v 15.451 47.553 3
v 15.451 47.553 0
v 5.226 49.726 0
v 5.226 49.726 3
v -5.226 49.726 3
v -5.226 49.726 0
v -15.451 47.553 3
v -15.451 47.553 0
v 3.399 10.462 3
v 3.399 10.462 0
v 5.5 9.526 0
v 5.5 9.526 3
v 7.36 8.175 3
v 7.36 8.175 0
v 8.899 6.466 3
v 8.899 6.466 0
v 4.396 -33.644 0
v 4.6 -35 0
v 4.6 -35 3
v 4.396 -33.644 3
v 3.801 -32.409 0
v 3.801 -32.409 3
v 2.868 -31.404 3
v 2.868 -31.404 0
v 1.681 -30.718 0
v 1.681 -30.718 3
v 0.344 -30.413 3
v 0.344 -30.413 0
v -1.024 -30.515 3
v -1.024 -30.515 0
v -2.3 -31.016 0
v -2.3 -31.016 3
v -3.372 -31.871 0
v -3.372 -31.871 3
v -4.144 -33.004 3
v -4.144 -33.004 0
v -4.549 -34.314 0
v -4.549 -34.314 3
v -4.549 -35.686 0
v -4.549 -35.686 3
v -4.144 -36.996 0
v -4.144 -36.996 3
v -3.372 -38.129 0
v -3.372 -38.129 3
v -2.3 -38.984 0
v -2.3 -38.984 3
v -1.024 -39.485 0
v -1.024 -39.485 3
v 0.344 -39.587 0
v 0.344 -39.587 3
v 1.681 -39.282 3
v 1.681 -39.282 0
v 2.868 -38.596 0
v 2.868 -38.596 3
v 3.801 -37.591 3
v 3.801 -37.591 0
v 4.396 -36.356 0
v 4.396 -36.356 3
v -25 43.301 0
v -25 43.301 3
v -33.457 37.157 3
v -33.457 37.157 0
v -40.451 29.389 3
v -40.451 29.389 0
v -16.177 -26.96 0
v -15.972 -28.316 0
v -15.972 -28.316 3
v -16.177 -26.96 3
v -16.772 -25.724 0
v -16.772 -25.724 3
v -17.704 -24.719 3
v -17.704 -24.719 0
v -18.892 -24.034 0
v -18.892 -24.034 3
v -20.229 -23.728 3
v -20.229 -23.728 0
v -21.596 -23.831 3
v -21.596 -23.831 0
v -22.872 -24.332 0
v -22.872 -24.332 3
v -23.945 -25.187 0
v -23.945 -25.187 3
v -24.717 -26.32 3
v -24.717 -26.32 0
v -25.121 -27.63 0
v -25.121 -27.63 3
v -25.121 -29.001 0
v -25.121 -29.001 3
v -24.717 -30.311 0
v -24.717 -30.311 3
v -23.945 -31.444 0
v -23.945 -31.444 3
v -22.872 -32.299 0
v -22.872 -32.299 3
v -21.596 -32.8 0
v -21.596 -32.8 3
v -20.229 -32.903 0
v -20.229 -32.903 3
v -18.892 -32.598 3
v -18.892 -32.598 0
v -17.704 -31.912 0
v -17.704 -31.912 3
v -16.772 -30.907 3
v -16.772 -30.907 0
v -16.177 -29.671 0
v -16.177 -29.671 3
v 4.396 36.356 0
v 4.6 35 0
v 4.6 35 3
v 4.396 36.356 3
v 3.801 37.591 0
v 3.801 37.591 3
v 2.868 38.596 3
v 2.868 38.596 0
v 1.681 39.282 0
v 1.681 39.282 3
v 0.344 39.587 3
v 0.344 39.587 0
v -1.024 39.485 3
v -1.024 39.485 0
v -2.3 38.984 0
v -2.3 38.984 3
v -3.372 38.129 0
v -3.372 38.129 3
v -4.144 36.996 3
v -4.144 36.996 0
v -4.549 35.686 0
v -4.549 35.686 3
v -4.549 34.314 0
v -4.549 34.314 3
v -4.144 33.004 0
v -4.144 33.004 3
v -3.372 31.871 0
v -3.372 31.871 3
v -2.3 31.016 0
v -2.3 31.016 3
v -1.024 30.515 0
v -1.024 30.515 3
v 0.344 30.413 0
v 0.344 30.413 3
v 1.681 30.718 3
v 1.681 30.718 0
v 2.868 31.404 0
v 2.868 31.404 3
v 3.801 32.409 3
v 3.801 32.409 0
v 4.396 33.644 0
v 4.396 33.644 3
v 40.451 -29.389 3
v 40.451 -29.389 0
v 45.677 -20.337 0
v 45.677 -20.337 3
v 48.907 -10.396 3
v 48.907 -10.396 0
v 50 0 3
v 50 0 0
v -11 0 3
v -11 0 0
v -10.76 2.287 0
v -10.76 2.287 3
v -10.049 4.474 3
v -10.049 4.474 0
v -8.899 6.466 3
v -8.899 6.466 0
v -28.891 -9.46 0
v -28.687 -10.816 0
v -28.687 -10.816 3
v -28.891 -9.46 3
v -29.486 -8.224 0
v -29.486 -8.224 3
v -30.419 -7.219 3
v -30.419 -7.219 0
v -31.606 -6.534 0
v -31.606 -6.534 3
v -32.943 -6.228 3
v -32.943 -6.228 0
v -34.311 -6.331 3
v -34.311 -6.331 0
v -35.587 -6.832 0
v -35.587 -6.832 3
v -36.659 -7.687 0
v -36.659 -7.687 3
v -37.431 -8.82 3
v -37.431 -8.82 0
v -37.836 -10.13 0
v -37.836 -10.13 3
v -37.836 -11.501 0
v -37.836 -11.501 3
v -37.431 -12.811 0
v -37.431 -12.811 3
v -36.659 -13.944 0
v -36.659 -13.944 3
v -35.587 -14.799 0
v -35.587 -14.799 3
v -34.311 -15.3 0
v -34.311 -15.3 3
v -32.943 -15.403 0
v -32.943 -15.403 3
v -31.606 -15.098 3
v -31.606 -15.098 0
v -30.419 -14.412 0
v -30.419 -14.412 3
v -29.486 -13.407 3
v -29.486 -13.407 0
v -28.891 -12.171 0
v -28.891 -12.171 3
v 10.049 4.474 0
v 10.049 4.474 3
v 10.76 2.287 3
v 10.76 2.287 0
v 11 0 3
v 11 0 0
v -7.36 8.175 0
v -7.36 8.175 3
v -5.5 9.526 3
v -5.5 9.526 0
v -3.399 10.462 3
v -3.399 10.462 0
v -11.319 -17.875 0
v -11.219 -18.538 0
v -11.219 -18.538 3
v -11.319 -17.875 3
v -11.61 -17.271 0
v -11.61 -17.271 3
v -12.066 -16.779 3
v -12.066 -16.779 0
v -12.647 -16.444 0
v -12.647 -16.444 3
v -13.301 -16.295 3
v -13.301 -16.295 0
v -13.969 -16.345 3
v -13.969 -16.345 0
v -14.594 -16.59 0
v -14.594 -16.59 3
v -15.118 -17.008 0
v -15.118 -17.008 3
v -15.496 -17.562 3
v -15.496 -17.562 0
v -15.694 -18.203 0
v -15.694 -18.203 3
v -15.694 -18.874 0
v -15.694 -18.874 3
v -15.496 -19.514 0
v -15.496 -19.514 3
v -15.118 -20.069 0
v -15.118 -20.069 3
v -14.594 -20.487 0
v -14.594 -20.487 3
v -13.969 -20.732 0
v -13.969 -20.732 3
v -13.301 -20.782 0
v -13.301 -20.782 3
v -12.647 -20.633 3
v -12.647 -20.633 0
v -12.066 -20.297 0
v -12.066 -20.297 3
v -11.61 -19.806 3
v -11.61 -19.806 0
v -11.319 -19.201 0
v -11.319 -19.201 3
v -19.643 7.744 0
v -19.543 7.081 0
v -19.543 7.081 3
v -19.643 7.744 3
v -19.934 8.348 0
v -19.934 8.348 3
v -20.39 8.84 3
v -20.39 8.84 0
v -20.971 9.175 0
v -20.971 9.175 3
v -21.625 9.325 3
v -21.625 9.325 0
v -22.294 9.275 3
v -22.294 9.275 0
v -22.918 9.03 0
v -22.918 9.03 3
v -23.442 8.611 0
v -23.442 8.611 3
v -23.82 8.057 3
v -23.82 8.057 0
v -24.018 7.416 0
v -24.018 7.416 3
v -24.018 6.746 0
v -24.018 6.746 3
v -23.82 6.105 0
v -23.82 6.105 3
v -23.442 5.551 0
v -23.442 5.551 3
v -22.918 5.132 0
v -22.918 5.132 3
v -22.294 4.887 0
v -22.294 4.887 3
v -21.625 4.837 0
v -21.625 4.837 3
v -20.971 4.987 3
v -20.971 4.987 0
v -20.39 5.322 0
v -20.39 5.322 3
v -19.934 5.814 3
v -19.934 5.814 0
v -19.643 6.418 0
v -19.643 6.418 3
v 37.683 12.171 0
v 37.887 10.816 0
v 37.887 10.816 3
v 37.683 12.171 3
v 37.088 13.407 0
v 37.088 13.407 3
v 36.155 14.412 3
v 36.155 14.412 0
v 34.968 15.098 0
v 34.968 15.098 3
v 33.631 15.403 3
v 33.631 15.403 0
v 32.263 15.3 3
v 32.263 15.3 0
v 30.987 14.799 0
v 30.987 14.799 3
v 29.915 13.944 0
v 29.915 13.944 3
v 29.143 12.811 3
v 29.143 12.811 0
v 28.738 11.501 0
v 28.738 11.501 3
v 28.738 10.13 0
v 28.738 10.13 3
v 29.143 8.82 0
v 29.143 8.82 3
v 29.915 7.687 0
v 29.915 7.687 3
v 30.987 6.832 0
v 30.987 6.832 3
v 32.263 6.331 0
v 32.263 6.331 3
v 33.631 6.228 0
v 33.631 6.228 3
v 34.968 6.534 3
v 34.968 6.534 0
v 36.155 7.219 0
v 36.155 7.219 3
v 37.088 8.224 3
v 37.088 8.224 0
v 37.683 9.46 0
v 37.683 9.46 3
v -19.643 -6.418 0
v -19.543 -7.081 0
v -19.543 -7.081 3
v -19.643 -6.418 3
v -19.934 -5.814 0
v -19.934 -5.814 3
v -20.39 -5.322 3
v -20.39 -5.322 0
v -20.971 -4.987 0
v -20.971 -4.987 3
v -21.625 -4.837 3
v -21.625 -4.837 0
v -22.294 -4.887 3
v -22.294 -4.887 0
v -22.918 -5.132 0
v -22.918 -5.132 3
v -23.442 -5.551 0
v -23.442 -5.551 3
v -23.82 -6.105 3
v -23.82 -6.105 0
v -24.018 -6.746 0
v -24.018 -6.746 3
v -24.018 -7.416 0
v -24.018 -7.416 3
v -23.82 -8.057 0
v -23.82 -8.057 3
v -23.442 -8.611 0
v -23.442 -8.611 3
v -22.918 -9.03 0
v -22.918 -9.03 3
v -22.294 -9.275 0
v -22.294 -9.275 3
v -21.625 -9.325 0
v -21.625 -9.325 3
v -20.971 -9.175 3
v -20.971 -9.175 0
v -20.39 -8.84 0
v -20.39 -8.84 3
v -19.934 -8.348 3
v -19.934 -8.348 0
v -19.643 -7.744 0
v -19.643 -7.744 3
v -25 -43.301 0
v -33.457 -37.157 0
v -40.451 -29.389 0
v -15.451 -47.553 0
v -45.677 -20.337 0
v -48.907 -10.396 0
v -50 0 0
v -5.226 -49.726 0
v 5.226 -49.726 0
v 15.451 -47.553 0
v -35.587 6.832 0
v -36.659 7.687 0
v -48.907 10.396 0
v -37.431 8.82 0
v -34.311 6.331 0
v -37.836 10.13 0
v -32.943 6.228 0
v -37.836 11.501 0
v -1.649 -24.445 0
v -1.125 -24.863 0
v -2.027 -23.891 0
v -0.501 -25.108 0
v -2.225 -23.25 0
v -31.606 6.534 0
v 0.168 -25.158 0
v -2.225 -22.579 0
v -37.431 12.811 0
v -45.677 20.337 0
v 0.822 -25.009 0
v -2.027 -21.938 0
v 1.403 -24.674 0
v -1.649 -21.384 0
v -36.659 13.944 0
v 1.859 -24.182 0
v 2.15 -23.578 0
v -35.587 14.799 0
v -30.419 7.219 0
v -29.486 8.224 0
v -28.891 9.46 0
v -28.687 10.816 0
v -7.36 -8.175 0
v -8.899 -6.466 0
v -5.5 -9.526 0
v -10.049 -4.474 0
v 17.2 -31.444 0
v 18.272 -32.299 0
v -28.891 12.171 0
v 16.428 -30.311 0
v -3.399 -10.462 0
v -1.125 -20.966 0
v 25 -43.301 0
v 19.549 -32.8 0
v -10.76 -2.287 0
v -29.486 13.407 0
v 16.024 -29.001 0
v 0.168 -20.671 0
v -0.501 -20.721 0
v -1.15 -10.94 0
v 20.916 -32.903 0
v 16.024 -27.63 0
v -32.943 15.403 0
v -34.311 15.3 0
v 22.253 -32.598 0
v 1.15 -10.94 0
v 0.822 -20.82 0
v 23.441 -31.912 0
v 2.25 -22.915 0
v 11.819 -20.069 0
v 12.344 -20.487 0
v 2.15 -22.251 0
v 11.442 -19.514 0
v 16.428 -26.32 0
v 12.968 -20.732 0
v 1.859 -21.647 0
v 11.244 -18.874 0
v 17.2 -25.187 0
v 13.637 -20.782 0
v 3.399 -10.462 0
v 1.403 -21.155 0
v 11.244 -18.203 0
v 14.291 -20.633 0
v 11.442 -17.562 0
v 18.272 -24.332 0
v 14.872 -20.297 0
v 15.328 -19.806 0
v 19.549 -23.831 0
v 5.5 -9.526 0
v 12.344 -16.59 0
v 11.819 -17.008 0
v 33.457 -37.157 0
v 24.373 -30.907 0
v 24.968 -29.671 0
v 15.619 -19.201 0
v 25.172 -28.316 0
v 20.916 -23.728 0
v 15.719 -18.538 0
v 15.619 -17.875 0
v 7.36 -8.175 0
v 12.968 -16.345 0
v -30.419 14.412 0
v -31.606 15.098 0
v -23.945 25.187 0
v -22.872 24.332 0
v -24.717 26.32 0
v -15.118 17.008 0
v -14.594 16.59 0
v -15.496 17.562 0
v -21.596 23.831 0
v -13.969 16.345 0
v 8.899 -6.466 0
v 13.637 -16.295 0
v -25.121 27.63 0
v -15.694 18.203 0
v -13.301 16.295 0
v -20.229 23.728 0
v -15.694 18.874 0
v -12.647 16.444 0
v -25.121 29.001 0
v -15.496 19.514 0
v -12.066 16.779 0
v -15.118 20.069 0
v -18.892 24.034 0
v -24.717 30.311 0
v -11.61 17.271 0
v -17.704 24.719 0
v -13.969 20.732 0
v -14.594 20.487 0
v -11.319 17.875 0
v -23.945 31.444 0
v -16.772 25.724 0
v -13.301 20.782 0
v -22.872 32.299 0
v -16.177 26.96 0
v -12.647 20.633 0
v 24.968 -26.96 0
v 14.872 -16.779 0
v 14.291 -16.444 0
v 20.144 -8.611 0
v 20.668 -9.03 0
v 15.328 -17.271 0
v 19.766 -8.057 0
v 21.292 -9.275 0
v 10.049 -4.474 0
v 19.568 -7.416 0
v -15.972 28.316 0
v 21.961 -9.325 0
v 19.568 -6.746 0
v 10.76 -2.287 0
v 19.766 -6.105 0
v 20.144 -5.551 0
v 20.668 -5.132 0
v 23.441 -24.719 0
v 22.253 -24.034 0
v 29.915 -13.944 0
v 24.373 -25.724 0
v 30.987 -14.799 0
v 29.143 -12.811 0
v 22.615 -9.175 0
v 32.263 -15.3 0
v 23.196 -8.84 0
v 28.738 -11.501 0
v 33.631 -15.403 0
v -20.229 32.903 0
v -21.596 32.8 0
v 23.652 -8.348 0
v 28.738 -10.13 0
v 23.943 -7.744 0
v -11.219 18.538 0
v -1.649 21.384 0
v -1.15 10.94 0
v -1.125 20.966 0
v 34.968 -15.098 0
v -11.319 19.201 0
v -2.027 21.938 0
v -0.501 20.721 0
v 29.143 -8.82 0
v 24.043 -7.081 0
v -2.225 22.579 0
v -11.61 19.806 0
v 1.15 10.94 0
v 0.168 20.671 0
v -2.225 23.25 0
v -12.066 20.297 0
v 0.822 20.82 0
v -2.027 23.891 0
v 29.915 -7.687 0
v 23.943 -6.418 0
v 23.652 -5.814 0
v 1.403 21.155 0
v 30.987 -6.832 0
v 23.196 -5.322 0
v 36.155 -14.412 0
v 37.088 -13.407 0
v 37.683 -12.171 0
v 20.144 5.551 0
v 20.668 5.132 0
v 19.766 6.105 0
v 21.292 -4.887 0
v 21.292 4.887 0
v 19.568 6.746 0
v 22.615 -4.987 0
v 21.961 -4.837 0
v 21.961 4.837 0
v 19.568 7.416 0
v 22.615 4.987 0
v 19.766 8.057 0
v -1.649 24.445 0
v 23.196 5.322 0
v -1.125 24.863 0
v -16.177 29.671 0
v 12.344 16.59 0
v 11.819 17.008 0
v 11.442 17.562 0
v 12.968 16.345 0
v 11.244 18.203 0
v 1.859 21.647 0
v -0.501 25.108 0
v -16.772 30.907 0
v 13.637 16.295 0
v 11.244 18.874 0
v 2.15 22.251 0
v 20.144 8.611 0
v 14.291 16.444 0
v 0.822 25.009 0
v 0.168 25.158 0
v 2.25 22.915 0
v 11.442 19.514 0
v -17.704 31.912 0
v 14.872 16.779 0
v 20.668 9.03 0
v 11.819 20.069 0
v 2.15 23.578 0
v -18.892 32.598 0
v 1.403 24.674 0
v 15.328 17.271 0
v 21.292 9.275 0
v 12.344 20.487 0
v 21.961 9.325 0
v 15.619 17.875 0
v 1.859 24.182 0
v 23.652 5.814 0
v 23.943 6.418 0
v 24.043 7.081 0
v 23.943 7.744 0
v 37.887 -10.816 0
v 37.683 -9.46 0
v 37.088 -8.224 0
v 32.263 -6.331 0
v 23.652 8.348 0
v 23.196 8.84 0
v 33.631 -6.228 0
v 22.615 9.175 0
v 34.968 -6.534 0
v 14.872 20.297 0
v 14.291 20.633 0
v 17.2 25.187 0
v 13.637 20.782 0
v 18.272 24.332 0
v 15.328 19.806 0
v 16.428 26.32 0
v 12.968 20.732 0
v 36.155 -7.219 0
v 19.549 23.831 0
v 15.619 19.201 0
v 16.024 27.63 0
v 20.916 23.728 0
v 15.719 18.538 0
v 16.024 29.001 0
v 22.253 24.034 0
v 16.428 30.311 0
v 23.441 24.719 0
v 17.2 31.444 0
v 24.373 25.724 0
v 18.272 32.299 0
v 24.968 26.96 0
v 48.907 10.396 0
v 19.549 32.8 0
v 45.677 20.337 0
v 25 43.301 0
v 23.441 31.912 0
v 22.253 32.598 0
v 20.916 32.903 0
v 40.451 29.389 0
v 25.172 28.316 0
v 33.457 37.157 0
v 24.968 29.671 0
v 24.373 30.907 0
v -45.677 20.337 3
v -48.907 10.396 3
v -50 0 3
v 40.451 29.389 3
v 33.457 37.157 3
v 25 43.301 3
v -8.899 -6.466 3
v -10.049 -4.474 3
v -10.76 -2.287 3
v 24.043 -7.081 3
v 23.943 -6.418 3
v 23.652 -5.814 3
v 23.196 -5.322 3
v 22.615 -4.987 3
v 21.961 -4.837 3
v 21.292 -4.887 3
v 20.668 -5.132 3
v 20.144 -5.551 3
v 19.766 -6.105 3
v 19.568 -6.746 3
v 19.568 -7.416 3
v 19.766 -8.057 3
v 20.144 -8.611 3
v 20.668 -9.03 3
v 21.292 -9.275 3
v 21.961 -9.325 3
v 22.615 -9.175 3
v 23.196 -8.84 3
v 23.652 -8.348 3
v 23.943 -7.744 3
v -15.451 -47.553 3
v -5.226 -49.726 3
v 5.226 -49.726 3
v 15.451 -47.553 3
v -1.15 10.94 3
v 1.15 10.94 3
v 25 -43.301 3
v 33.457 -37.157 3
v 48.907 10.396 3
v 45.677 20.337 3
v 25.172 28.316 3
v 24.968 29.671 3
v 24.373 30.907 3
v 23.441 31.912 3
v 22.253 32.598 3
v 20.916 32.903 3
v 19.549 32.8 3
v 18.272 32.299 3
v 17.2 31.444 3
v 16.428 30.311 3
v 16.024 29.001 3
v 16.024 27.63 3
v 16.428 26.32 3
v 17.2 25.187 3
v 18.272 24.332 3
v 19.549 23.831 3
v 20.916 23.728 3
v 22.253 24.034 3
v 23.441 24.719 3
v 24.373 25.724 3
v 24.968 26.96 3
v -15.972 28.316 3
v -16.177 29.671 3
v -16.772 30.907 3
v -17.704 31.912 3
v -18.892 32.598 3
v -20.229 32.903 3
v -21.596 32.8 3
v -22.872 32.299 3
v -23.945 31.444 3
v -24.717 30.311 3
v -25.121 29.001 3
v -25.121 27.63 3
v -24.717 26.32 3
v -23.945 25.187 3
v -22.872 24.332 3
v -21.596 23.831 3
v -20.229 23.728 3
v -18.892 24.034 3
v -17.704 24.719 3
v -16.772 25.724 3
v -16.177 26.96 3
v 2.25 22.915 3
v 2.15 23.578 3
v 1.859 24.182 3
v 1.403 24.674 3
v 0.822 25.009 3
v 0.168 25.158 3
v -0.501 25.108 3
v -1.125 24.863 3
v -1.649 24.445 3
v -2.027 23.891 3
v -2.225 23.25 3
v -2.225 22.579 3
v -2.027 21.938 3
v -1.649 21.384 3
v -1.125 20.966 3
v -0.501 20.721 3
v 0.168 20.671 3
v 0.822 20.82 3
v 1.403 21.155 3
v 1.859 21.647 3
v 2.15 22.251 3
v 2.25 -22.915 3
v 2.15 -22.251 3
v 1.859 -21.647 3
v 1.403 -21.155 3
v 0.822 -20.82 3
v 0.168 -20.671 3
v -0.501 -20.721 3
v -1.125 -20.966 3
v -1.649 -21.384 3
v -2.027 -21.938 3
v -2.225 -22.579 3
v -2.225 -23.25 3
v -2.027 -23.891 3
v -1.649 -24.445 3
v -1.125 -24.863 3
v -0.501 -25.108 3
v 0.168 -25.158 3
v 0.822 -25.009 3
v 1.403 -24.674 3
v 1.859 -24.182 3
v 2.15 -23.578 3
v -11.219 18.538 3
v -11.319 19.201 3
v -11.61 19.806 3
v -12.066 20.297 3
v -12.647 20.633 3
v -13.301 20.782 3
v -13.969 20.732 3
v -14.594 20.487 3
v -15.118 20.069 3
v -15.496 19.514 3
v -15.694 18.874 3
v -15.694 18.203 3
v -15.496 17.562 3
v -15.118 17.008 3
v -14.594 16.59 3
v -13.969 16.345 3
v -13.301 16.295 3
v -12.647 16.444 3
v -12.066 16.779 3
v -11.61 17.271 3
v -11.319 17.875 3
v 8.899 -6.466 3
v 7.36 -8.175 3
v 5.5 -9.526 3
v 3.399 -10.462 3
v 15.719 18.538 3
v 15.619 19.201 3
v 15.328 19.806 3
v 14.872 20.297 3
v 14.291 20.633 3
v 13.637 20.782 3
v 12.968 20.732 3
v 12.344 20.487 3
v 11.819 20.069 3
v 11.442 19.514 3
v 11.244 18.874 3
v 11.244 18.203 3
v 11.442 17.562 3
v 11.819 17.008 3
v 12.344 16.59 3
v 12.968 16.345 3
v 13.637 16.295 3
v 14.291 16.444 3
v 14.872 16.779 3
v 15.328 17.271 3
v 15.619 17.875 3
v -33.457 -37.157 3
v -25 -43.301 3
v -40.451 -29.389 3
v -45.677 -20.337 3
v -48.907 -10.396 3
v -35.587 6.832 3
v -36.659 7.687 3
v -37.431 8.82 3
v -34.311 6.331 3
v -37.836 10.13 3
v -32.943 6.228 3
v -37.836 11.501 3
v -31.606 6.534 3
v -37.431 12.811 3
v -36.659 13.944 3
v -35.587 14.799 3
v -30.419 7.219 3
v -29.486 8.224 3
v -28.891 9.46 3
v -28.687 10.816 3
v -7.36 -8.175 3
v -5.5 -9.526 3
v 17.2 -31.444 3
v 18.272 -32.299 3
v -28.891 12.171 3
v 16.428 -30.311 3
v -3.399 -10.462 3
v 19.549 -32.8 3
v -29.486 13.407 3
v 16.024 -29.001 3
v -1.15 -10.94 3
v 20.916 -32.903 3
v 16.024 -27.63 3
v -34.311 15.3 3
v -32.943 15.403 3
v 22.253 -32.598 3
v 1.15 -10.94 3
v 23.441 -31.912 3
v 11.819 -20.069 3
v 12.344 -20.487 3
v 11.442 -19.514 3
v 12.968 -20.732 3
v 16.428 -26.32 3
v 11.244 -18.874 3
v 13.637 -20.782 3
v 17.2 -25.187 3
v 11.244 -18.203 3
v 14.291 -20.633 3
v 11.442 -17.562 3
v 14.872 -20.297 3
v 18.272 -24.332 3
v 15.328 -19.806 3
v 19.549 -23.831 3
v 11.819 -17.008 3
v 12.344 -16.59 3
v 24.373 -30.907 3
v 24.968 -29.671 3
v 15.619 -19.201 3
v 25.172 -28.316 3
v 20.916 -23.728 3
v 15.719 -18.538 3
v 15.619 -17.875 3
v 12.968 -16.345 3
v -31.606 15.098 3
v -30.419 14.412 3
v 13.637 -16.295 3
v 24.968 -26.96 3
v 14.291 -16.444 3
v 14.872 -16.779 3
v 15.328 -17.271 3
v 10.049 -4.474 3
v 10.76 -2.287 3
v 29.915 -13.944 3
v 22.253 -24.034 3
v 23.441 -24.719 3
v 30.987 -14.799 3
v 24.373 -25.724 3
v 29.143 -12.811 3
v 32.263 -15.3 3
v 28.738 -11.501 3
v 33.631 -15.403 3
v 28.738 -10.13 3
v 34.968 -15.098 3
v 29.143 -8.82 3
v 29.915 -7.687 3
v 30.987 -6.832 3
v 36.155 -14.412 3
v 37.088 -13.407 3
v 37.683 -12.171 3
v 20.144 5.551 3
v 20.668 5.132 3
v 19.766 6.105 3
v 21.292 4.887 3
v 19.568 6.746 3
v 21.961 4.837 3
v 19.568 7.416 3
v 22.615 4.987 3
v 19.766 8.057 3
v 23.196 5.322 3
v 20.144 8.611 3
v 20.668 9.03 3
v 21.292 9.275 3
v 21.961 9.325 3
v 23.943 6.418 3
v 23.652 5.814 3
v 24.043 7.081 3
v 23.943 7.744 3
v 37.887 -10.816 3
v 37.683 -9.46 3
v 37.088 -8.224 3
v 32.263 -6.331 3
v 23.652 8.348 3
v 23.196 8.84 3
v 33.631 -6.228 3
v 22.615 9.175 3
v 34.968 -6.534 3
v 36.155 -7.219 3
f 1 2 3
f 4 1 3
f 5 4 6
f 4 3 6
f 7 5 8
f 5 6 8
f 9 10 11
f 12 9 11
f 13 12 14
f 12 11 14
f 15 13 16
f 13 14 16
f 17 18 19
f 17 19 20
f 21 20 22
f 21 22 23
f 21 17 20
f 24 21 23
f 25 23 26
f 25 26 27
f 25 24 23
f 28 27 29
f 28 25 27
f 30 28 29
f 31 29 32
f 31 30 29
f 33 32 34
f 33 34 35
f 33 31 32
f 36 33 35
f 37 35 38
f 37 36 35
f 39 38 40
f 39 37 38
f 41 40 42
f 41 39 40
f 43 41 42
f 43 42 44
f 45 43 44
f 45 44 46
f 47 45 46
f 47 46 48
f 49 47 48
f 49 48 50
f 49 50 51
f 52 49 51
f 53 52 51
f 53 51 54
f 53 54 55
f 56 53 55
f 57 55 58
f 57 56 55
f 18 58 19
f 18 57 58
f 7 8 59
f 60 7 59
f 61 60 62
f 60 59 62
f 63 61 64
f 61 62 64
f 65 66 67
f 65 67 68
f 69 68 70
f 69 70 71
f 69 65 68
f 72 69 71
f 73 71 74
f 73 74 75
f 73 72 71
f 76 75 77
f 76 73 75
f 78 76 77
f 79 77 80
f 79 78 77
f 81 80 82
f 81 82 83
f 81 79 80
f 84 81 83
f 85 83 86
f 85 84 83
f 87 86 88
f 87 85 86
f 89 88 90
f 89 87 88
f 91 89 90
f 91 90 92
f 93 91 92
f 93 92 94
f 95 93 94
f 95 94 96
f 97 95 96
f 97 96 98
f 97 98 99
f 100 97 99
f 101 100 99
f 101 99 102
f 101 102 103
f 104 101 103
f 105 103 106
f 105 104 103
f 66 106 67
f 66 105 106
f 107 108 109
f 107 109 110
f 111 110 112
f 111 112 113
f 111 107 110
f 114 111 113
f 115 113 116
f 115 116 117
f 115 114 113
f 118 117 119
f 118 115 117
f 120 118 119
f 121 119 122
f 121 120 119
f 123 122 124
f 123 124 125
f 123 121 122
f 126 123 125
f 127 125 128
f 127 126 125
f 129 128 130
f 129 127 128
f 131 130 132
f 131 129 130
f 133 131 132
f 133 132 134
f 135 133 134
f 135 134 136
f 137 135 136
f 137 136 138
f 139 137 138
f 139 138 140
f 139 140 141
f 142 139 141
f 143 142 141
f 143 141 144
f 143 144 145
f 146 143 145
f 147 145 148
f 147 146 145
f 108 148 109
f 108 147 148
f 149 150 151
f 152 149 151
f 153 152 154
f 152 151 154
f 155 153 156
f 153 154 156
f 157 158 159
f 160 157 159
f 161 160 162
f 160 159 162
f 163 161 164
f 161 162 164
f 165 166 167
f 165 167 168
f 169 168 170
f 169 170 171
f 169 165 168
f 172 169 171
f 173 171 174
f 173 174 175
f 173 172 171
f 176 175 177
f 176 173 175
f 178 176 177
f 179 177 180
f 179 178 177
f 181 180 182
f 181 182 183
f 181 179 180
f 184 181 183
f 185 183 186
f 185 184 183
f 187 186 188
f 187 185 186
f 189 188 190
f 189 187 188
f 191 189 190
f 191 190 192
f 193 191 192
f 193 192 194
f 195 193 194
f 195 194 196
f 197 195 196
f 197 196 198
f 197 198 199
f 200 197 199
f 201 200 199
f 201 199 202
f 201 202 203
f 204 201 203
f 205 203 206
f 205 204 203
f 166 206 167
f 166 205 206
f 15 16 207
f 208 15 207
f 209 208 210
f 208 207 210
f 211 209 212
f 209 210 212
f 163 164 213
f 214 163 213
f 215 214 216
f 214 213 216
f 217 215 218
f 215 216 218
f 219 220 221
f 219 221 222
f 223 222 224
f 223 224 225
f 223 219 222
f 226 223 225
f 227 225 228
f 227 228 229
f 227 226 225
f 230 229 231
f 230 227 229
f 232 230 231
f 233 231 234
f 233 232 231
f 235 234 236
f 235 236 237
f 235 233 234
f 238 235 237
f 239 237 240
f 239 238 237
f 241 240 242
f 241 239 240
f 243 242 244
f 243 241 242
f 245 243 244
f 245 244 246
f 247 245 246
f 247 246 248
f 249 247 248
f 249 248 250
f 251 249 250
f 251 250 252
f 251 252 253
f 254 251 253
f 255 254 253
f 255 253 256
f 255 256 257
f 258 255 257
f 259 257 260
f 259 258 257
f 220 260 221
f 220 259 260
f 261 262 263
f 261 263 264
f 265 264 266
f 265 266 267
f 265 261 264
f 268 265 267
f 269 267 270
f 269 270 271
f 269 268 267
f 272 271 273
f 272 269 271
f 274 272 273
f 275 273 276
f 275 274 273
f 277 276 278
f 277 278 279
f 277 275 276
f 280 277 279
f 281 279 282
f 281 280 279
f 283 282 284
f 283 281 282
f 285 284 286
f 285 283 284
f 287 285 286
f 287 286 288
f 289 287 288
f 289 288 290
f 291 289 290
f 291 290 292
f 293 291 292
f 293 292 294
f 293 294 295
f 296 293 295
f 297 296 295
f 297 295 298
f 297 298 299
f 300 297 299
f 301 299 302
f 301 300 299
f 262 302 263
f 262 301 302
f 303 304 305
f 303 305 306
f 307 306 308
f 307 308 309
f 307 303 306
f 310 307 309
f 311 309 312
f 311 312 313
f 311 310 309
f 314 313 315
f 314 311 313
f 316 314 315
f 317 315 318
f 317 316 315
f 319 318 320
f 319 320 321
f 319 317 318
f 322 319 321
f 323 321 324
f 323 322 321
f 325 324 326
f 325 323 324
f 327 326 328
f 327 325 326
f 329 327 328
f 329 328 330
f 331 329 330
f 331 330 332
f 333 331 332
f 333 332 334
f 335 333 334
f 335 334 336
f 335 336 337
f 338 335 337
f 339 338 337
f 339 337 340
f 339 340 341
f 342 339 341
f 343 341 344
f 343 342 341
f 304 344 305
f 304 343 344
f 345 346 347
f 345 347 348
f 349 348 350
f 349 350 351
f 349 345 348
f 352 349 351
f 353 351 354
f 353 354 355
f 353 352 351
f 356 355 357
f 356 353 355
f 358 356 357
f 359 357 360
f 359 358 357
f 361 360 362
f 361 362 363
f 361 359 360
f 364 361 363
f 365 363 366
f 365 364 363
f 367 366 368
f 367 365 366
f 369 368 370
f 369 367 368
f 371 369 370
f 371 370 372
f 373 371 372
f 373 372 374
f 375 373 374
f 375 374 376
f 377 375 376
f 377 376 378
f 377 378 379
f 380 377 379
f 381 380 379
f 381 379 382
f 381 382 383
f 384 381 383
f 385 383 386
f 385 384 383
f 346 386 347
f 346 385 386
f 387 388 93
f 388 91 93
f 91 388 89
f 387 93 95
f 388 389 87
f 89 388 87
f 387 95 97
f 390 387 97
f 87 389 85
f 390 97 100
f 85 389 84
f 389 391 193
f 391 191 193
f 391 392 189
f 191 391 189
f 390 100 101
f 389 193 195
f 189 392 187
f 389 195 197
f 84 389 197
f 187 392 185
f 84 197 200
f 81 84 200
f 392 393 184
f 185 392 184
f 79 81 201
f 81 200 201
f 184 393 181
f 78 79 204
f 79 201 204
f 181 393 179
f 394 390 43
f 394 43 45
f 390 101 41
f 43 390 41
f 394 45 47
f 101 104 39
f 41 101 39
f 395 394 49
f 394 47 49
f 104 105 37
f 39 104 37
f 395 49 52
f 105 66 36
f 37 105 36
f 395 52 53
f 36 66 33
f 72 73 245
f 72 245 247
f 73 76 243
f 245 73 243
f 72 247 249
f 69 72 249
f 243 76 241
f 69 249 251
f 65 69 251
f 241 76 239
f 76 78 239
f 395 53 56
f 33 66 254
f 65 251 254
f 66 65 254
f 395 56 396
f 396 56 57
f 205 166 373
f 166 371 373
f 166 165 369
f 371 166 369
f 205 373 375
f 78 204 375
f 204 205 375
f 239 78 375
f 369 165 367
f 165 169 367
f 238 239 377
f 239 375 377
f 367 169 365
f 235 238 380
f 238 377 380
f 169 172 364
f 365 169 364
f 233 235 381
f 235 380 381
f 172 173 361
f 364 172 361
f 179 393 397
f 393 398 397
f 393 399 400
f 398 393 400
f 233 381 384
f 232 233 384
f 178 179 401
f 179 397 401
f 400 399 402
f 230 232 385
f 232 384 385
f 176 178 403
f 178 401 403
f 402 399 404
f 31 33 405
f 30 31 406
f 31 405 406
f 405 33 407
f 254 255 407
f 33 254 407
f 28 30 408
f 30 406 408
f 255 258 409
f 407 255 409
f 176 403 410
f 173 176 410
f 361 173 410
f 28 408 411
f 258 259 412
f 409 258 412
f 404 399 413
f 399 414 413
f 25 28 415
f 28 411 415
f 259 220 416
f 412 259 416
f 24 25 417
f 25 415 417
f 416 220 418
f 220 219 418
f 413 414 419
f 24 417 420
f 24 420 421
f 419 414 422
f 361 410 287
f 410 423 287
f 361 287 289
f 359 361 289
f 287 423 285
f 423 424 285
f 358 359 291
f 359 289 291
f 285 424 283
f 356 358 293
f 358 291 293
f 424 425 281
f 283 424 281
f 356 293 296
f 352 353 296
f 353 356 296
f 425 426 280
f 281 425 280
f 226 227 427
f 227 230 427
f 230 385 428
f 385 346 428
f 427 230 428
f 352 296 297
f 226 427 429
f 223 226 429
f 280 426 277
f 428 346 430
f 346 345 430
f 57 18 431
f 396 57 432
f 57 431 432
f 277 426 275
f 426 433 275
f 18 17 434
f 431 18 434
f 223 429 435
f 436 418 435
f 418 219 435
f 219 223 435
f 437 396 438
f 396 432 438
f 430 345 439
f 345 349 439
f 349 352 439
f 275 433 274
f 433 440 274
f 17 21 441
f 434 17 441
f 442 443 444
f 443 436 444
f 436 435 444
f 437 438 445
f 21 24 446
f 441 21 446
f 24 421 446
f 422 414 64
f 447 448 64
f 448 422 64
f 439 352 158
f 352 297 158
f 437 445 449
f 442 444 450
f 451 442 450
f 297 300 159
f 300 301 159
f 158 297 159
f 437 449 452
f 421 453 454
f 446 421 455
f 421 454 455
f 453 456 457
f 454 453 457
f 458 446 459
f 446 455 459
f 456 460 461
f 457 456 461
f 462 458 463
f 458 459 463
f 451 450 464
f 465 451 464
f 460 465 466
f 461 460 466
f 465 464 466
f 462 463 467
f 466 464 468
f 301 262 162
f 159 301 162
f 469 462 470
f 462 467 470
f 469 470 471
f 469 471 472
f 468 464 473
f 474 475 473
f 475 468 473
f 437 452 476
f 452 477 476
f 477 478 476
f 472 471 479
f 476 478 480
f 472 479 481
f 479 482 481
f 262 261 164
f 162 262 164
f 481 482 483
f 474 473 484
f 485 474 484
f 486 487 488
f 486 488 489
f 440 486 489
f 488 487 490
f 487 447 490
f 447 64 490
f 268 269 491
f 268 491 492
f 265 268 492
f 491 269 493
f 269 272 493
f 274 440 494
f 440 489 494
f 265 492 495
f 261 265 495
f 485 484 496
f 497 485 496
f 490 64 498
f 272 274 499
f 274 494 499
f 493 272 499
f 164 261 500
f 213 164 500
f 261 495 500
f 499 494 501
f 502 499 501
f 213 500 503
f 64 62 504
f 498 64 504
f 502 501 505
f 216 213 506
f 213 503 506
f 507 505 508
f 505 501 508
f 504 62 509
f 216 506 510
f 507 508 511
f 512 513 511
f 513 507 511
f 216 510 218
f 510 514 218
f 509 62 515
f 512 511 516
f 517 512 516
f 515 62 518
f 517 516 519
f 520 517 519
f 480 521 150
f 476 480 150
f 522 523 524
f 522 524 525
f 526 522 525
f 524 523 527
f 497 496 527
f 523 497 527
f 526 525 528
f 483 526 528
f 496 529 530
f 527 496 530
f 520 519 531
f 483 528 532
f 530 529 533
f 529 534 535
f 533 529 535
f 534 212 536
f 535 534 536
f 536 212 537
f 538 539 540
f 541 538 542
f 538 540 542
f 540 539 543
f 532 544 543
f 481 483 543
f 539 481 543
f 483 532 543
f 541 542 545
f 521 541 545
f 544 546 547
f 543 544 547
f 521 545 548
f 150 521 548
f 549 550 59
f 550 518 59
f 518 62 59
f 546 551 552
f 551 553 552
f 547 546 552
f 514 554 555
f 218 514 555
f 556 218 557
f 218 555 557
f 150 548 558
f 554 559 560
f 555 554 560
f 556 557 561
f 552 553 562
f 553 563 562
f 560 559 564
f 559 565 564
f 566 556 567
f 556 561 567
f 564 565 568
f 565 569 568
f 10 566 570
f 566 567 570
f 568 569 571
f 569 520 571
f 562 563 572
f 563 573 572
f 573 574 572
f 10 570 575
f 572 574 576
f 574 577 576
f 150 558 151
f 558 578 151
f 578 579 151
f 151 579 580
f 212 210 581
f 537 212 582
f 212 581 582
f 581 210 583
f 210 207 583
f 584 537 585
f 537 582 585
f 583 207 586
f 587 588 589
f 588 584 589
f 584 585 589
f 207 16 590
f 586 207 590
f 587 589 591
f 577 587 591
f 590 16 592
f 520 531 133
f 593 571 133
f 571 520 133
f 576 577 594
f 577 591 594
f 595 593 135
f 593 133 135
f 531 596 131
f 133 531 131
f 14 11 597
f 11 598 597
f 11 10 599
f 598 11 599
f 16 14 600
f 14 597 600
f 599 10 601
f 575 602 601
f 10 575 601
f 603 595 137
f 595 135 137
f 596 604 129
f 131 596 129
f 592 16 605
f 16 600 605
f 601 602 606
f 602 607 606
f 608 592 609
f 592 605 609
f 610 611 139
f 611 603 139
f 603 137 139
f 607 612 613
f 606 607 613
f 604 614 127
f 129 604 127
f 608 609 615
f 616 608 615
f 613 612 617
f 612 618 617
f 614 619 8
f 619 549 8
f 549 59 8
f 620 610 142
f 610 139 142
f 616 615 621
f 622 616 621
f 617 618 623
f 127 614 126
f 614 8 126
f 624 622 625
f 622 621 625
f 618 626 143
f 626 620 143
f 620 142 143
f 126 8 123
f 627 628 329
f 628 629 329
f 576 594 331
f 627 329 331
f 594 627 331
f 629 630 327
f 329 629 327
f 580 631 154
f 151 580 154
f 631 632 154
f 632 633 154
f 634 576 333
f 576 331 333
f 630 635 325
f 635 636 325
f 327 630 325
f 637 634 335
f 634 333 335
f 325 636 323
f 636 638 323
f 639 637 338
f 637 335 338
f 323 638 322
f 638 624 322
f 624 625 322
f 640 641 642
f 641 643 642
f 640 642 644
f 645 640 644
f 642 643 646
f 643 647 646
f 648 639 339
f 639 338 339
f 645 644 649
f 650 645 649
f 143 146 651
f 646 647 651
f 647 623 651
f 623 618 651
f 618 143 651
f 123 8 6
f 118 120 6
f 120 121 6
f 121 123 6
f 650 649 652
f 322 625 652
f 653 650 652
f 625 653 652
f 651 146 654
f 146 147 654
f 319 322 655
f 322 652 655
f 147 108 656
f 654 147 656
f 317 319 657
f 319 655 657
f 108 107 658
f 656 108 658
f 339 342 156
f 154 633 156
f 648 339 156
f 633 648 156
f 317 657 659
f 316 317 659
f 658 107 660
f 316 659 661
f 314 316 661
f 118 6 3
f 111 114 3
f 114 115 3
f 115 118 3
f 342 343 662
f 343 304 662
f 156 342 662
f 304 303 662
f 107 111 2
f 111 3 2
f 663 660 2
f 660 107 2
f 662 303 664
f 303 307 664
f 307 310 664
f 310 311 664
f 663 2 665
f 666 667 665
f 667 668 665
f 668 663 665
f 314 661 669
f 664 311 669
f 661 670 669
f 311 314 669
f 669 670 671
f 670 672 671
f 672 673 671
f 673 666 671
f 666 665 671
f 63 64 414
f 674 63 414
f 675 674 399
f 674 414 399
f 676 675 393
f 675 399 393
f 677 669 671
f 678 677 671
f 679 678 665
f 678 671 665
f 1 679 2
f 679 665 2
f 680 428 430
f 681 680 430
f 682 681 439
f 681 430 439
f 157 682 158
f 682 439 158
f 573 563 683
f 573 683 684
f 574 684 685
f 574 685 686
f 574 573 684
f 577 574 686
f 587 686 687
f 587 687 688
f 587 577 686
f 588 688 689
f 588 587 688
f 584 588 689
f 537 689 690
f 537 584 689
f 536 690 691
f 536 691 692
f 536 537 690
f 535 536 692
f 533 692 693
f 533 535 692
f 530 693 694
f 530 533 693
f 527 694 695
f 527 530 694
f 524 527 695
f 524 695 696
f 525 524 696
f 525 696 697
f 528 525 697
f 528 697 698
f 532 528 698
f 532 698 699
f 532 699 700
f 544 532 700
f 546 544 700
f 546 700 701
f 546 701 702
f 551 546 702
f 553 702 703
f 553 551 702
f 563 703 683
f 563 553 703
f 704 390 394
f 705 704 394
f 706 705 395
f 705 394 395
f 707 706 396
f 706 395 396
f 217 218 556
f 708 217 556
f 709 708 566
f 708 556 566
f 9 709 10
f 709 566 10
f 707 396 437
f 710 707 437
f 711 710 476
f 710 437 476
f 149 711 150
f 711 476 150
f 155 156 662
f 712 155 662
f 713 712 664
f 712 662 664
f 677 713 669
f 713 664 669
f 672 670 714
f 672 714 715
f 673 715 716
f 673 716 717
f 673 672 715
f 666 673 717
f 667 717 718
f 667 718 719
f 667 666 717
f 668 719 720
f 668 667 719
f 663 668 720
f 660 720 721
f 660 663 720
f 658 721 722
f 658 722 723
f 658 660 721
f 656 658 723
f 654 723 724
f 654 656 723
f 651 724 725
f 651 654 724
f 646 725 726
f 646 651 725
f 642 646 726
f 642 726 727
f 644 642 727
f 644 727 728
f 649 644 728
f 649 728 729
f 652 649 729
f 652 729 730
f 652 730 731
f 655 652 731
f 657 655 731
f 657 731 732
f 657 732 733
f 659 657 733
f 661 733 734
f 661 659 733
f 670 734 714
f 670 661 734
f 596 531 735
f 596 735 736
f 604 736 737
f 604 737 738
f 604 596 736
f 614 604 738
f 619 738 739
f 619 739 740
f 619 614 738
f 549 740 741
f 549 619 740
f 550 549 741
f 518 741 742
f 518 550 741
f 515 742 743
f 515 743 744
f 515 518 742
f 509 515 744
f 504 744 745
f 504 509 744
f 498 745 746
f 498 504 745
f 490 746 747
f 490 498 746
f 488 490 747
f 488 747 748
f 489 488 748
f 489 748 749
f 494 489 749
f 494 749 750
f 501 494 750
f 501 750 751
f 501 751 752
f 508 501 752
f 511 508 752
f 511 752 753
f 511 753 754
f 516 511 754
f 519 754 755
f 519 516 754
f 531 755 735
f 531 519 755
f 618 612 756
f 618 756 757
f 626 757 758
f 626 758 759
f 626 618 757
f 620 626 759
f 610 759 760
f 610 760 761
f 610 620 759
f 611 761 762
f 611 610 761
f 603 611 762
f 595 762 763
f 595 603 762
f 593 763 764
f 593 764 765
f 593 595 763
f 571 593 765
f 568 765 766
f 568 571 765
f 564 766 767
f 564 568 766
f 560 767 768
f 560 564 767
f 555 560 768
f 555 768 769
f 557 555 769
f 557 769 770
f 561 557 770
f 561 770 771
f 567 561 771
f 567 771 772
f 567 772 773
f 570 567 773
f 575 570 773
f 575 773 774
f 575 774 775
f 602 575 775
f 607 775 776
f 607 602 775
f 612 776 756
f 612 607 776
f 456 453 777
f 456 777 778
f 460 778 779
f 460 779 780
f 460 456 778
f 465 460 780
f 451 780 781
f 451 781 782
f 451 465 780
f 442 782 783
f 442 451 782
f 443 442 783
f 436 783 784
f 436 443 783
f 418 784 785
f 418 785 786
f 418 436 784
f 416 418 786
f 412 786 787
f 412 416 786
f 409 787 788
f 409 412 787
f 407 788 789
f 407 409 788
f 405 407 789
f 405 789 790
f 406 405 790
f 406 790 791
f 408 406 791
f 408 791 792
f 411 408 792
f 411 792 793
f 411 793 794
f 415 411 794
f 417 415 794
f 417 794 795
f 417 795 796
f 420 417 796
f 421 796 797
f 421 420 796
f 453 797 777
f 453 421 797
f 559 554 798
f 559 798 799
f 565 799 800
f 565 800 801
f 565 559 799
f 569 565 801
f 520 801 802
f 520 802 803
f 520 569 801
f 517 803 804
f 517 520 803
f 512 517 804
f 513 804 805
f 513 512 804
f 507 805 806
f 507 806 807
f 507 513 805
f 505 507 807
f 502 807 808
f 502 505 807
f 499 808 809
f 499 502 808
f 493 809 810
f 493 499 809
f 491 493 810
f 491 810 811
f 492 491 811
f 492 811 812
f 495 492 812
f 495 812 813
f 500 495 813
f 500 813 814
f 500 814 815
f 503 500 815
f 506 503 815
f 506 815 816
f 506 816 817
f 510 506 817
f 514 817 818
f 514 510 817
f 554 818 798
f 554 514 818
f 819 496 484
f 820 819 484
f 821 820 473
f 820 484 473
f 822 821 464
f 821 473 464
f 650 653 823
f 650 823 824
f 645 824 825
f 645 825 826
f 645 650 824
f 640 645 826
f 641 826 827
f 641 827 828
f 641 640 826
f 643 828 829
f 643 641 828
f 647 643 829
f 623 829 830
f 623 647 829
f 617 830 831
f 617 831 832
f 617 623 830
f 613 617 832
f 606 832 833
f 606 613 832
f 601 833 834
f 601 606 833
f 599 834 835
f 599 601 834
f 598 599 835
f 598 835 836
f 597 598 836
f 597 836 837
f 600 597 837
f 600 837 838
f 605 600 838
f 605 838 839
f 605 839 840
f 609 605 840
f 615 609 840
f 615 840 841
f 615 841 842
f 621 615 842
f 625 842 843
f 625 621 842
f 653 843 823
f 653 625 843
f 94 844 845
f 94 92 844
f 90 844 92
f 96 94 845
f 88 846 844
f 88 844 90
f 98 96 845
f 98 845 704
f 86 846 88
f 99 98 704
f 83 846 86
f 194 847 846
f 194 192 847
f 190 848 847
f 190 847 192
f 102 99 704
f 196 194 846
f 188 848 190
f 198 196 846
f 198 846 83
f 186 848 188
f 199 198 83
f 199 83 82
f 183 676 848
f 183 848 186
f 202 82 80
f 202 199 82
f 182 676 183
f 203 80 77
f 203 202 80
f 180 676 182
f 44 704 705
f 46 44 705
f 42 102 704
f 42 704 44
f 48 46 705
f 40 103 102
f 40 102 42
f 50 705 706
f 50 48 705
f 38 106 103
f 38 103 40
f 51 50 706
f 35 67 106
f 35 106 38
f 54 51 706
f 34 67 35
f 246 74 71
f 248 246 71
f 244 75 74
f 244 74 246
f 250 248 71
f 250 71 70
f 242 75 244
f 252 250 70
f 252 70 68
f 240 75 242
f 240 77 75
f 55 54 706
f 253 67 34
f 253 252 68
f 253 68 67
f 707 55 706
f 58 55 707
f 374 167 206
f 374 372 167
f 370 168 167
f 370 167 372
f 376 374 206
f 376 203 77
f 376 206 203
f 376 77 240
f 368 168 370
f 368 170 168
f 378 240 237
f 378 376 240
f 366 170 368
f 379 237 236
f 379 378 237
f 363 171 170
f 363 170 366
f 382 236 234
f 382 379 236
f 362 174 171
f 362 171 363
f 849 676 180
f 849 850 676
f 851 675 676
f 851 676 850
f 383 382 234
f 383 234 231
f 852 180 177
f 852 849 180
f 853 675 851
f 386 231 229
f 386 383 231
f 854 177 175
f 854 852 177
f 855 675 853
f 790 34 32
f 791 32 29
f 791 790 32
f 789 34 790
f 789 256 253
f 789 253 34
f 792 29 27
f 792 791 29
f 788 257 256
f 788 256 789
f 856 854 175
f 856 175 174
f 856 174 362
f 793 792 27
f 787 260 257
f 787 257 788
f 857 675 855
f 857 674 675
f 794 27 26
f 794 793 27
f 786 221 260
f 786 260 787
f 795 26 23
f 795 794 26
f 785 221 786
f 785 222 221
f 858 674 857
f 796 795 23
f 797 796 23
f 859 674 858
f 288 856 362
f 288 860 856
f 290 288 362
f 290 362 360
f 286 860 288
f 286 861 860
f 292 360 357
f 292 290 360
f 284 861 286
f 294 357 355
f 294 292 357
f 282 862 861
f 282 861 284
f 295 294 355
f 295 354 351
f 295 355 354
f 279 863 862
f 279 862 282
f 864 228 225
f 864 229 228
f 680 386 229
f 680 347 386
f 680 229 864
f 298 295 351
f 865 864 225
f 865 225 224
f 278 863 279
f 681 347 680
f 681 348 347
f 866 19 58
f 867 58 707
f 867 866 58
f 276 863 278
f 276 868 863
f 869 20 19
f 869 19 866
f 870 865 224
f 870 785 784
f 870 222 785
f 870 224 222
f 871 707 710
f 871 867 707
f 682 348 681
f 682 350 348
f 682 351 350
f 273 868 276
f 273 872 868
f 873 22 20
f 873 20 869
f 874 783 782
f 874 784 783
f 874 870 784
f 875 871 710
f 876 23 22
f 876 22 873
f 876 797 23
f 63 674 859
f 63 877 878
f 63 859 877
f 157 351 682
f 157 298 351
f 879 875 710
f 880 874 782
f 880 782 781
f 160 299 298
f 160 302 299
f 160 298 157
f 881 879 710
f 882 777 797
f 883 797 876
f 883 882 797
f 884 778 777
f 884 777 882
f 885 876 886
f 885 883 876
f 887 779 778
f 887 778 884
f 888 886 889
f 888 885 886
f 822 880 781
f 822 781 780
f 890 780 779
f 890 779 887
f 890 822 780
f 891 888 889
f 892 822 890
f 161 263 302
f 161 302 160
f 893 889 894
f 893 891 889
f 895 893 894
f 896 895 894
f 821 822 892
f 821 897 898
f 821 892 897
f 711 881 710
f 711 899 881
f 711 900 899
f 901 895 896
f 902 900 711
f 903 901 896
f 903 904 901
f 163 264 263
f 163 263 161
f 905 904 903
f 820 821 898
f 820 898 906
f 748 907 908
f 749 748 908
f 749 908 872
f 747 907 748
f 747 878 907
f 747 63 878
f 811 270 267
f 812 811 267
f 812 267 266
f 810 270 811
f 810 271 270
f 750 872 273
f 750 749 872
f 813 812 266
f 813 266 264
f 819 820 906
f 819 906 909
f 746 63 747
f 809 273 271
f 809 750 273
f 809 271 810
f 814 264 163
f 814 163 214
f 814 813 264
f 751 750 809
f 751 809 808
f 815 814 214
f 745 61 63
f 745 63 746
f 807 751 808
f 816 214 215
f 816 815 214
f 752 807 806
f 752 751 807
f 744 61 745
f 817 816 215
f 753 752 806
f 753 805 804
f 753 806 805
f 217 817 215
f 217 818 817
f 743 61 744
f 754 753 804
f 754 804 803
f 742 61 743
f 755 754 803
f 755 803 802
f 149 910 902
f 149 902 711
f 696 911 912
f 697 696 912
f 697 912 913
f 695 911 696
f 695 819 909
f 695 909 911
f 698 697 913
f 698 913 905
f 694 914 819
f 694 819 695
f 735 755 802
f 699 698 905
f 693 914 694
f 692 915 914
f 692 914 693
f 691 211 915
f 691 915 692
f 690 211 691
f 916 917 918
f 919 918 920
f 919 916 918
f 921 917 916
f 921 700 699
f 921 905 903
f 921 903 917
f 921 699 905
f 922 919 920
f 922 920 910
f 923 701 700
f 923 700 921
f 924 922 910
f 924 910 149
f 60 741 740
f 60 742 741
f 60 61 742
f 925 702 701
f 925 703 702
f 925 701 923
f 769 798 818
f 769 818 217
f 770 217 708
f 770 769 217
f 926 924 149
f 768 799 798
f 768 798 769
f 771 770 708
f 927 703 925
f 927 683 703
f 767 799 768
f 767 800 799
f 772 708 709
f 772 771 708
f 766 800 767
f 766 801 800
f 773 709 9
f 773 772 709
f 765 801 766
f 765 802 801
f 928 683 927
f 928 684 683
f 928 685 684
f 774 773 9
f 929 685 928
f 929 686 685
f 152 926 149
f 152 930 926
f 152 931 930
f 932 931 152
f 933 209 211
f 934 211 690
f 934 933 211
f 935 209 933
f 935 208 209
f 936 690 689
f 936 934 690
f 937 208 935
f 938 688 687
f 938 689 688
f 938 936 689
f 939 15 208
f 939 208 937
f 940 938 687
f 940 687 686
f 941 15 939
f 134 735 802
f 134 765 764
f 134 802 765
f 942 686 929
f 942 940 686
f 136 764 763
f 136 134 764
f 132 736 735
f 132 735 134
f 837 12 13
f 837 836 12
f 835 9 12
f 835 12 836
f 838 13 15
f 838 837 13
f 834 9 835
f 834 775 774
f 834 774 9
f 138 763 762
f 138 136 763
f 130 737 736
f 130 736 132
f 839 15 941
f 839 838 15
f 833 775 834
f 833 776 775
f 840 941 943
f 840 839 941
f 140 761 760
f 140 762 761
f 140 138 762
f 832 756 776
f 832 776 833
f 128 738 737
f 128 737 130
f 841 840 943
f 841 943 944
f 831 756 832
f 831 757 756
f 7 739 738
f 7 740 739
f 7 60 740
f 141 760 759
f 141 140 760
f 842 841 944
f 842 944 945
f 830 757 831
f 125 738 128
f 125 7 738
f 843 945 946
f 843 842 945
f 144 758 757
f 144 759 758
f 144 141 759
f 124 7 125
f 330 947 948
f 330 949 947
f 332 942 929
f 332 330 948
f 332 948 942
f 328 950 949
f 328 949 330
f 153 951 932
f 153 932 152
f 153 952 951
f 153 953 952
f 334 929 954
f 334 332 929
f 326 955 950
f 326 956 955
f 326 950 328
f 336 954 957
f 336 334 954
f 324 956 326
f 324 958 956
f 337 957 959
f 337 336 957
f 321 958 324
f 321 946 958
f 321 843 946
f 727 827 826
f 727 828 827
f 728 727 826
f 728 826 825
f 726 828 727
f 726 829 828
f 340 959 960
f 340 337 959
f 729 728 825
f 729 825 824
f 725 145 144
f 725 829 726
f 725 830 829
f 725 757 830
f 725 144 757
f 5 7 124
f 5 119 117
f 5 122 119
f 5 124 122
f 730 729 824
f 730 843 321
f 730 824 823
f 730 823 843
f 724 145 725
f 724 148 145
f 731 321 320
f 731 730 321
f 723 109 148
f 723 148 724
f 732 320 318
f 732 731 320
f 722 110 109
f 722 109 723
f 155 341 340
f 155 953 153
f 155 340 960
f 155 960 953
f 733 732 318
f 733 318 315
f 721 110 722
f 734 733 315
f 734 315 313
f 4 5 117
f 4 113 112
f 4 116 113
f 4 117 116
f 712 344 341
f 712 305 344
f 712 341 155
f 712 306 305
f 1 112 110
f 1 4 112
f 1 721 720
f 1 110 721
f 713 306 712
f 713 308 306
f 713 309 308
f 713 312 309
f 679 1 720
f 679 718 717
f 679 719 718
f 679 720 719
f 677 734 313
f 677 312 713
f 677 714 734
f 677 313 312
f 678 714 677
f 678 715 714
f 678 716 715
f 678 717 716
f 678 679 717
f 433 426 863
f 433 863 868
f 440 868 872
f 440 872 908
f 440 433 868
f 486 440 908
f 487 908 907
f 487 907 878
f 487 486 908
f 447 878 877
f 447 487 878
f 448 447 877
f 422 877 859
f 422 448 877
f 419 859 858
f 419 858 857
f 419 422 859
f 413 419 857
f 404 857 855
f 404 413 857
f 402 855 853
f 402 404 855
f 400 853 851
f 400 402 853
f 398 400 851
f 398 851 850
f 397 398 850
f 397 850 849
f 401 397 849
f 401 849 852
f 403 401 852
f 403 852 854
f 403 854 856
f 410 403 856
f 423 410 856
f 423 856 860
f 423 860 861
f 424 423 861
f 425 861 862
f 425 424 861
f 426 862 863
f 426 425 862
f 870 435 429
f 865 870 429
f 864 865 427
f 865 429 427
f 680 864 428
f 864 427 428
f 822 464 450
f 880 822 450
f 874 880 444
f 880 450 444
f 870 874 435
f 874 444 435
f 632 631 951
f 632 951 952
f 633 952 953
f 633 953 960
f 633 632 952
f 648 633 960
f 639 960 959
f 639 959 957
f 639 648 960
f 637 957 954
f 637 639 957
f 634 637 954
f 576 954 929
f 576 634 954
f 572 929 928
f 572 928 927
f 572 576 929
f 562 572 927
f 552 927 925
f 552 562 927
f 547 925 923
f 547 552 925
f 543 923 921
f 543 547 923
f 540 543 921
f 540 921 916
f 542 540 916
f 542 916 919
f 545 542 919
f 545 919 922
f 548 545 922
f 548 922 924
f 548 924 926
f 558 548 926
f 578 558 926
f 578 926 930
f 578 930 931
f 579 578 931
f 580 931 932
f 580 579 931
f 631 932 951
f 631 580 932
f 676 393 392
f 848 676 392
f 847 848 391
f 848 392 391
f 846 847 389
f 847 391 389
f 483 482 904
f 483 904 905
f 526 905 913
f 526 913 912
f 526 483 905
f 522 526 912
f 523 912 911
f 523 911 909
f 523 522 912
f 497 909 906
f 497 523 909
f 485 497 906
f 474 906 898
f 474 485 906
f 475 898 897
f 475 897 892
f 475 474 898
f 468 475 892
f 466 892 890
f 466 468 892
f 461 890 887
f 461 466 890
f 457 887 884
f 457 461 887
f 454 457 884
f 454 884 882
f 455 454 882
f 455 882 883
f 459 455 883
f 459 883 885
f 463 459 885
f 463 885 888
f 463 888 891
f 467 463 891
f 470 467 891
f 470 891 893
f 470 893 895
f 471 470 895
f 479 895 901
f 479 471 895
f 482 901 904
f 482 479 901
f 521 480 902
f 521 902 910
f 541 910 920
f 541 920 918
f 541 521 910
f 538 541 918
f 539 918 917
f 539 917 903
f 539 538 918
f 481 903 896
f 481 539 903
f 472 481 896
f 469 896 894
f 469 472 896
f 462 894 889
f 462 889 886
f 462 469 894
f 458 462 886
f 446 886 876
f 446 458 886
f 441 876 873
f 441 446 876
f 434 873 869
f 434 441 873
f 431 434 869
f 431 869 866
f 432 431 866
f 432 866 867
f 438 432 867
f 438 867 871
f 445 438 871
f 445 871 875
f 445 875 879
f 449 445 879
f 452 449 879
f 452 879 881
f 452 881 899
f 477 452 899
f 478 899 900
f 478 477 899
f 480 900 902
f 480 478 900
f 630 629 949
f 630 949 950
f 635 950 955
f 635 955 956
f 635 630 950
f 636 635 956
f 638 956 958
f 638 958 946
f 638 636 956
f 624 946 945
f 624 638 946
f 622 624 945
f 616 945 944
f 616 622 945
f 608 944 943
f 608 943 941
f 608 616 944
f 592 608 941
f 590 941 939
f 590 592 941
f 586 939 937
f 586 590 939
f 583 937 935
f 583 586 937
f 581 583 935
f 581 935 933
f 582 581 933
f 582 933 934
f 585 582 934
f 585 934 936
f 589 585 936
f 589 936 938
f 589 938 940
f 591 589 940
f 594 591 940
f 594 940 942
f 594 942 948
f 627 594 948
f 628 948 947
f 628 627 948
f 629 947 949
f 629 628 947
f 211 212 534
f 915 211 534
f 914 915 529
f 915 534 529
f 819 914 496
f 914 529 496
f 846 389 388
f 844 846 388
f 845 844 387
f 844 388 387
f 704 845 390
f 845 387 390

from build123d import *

# Parameters (mm, degrees)
F0_R     = 4.6
F0_R_2   = 2.25
F1_DEPTH = 3


with BuildPart() as f1:
    # F0 (on Top) → F1 (new body)
    with BuildSketch(Plane.XY):
        with BuildLine():
            ThreePointArc((40.45085, 29.389263), (29.389263, 40.45085), (15.45085, 47.552826))
            ThreePointArc((15.45085, 47.552826), (0, 50), (-15.45085, 47.552826))
            ThreePointArc((-15.45085, 47.552826), (-29.389263, 40.45085), (-40.45085, 29.389263))
            ThreePointArc((-40.45085, 29.389263), (-47.552826, 15.45085), (-50, 0))
            ThreePointArc((-50, 0), (-47.552826, -15.45085), (-40.45085, -29.389263))
            ThreePointArc((-40.45085, -29.389263), (-29.389263, -40.45085), (-15.45085, -47.552826))
            ThreePointArc((-15.45085, -47.552826), (0, -50), (15.45085, -47.552826))
            ThreePointArc((15.45085, -47.552826), (29.389263, -40.45085), (40.45085, -29.389263))
            ThreePointArc((40.45085, -29.389263), (47.552826, -15.45085), (50, 0))
            ThreePointArc((50, 0), (47.552826, 15.45085), (40.45085, 29.389263))
        make_face()
        with Locations((-20.572484, -28.315595)):
            Circle(F0_R, mode=Mode.SUBTRACT)
        with Locations((-33.286978, -10.815595)):
            Circle(F0_R, mode=Mode.SUBTRACT)
        with Locations((-13.468813, -18.538231)):
            Circle(F0_R_2, mode=Mode.SUBTRACT)
        with Locations((-21.792998, -7.080974)):
            Circle(F0_R_2, mode=Mode.SUBTRACT)
        with Locations((0, -35)):
            Circle(F0_R, mode=Mode.SUBTRACT)
        with Locations((20.572484, -28.315595)):
            Circle(F0_R, mode=Mode.SUBTRACT)
        with Locations((0, -22.914514)):
            Circle(F0_R_2, mode=Mode.SUBTRACT)
        with Locations((13.468813, -18.538231)):
            Circle(F0_R_2, mode=Mode.SUBTRACT)
        with BuildLine():
            ThreePointArc((-3.399187, 10.461622), (0, 11), (3.399187, 10.461622))
            ThreePointArc((3.399187, 10.461622), (6.465638, 8.899187), (8.899187, 6.465638))
            ThreePointArc((8.899187, 6.465638), (10.461622, 3.399187), (11, 0))
            ThreePointArc((11, 0), (10.461622, -3.399187), (8.899187, -6.465638))
            ThreePointArc((8.899187, -6.465638), (6.465638, -8.899187), (3.399187, -10.461622))
            ThreePointArc((3.399187, -10.461622), (0, -11), (-3.399187, -10.461622))
            ThreePointArc((-3.399187, -10.461622), (-6.465638, -8.899187), (-8.899187, -6.465638))
            ThreePointArc((-8.899187, -6.465638), (-10.461622, -3.399187), (-11, 0))
            ThreePointArc((-11, 0), (-10.461622, 3.399187), (-8.899187, 6.465638))
            ThreePointArc((-8.899187, 6.465638), (-6.465638, 8.899187), (-3.399187, 10.461622))
        make_face(mode=Mode.SUBTRACT)
        with Locations((21.792998, -7.080974)):
            Circle(F0_R_2, mode=Mode.SUBTRACT)
        with Locations((33.286978, -10.815595)):
            Circle(F0_R, mode=Mode.SUBTRACT)
        with Locations((-33.286978, 10.815595)):
            Circle(F0_R, mode=Mode.SUBTRACT)
        with Locations((-21.792998, 7.080974)):
            Circle(F0_R_2, mode=Mode.SUBTRACT)
        with Locations((-13.468813, 18.538231)):
            Circle(F0_R_2, mode=Mode.SUBTRACT)
        with Locations((-20.572484, 28.315595)):
            Circle(F0_R, mode=Mode.SUBTRACT)
        with Locations((21.792998, 7.080974)):
            Circle(F0_R_2, mode=Mode.SUBTRACT)
        with Locations((0, 22.914514)):
            Circle(F0_R_2, mode=Mode.SUBTRACT)
        with Locations((13.468813, 18.538231)):
            Circle(F0_R_2, mode=Mode.SUBTRACT)
        with Locations((33.286978, 10.815595)):
            Circle(F0_R, mode=Mode.SUBTRACT)
        with Locations((0, 35)):
            Circle(F0_R, mode=Mode.SUBTRACT)
        with Locations((20.572484, 28.315595)):
            Circle(F0_R, mode=Mode.SUBTRACT)
    extrude(amount=F1_DEPTH)


solid = f1.part
